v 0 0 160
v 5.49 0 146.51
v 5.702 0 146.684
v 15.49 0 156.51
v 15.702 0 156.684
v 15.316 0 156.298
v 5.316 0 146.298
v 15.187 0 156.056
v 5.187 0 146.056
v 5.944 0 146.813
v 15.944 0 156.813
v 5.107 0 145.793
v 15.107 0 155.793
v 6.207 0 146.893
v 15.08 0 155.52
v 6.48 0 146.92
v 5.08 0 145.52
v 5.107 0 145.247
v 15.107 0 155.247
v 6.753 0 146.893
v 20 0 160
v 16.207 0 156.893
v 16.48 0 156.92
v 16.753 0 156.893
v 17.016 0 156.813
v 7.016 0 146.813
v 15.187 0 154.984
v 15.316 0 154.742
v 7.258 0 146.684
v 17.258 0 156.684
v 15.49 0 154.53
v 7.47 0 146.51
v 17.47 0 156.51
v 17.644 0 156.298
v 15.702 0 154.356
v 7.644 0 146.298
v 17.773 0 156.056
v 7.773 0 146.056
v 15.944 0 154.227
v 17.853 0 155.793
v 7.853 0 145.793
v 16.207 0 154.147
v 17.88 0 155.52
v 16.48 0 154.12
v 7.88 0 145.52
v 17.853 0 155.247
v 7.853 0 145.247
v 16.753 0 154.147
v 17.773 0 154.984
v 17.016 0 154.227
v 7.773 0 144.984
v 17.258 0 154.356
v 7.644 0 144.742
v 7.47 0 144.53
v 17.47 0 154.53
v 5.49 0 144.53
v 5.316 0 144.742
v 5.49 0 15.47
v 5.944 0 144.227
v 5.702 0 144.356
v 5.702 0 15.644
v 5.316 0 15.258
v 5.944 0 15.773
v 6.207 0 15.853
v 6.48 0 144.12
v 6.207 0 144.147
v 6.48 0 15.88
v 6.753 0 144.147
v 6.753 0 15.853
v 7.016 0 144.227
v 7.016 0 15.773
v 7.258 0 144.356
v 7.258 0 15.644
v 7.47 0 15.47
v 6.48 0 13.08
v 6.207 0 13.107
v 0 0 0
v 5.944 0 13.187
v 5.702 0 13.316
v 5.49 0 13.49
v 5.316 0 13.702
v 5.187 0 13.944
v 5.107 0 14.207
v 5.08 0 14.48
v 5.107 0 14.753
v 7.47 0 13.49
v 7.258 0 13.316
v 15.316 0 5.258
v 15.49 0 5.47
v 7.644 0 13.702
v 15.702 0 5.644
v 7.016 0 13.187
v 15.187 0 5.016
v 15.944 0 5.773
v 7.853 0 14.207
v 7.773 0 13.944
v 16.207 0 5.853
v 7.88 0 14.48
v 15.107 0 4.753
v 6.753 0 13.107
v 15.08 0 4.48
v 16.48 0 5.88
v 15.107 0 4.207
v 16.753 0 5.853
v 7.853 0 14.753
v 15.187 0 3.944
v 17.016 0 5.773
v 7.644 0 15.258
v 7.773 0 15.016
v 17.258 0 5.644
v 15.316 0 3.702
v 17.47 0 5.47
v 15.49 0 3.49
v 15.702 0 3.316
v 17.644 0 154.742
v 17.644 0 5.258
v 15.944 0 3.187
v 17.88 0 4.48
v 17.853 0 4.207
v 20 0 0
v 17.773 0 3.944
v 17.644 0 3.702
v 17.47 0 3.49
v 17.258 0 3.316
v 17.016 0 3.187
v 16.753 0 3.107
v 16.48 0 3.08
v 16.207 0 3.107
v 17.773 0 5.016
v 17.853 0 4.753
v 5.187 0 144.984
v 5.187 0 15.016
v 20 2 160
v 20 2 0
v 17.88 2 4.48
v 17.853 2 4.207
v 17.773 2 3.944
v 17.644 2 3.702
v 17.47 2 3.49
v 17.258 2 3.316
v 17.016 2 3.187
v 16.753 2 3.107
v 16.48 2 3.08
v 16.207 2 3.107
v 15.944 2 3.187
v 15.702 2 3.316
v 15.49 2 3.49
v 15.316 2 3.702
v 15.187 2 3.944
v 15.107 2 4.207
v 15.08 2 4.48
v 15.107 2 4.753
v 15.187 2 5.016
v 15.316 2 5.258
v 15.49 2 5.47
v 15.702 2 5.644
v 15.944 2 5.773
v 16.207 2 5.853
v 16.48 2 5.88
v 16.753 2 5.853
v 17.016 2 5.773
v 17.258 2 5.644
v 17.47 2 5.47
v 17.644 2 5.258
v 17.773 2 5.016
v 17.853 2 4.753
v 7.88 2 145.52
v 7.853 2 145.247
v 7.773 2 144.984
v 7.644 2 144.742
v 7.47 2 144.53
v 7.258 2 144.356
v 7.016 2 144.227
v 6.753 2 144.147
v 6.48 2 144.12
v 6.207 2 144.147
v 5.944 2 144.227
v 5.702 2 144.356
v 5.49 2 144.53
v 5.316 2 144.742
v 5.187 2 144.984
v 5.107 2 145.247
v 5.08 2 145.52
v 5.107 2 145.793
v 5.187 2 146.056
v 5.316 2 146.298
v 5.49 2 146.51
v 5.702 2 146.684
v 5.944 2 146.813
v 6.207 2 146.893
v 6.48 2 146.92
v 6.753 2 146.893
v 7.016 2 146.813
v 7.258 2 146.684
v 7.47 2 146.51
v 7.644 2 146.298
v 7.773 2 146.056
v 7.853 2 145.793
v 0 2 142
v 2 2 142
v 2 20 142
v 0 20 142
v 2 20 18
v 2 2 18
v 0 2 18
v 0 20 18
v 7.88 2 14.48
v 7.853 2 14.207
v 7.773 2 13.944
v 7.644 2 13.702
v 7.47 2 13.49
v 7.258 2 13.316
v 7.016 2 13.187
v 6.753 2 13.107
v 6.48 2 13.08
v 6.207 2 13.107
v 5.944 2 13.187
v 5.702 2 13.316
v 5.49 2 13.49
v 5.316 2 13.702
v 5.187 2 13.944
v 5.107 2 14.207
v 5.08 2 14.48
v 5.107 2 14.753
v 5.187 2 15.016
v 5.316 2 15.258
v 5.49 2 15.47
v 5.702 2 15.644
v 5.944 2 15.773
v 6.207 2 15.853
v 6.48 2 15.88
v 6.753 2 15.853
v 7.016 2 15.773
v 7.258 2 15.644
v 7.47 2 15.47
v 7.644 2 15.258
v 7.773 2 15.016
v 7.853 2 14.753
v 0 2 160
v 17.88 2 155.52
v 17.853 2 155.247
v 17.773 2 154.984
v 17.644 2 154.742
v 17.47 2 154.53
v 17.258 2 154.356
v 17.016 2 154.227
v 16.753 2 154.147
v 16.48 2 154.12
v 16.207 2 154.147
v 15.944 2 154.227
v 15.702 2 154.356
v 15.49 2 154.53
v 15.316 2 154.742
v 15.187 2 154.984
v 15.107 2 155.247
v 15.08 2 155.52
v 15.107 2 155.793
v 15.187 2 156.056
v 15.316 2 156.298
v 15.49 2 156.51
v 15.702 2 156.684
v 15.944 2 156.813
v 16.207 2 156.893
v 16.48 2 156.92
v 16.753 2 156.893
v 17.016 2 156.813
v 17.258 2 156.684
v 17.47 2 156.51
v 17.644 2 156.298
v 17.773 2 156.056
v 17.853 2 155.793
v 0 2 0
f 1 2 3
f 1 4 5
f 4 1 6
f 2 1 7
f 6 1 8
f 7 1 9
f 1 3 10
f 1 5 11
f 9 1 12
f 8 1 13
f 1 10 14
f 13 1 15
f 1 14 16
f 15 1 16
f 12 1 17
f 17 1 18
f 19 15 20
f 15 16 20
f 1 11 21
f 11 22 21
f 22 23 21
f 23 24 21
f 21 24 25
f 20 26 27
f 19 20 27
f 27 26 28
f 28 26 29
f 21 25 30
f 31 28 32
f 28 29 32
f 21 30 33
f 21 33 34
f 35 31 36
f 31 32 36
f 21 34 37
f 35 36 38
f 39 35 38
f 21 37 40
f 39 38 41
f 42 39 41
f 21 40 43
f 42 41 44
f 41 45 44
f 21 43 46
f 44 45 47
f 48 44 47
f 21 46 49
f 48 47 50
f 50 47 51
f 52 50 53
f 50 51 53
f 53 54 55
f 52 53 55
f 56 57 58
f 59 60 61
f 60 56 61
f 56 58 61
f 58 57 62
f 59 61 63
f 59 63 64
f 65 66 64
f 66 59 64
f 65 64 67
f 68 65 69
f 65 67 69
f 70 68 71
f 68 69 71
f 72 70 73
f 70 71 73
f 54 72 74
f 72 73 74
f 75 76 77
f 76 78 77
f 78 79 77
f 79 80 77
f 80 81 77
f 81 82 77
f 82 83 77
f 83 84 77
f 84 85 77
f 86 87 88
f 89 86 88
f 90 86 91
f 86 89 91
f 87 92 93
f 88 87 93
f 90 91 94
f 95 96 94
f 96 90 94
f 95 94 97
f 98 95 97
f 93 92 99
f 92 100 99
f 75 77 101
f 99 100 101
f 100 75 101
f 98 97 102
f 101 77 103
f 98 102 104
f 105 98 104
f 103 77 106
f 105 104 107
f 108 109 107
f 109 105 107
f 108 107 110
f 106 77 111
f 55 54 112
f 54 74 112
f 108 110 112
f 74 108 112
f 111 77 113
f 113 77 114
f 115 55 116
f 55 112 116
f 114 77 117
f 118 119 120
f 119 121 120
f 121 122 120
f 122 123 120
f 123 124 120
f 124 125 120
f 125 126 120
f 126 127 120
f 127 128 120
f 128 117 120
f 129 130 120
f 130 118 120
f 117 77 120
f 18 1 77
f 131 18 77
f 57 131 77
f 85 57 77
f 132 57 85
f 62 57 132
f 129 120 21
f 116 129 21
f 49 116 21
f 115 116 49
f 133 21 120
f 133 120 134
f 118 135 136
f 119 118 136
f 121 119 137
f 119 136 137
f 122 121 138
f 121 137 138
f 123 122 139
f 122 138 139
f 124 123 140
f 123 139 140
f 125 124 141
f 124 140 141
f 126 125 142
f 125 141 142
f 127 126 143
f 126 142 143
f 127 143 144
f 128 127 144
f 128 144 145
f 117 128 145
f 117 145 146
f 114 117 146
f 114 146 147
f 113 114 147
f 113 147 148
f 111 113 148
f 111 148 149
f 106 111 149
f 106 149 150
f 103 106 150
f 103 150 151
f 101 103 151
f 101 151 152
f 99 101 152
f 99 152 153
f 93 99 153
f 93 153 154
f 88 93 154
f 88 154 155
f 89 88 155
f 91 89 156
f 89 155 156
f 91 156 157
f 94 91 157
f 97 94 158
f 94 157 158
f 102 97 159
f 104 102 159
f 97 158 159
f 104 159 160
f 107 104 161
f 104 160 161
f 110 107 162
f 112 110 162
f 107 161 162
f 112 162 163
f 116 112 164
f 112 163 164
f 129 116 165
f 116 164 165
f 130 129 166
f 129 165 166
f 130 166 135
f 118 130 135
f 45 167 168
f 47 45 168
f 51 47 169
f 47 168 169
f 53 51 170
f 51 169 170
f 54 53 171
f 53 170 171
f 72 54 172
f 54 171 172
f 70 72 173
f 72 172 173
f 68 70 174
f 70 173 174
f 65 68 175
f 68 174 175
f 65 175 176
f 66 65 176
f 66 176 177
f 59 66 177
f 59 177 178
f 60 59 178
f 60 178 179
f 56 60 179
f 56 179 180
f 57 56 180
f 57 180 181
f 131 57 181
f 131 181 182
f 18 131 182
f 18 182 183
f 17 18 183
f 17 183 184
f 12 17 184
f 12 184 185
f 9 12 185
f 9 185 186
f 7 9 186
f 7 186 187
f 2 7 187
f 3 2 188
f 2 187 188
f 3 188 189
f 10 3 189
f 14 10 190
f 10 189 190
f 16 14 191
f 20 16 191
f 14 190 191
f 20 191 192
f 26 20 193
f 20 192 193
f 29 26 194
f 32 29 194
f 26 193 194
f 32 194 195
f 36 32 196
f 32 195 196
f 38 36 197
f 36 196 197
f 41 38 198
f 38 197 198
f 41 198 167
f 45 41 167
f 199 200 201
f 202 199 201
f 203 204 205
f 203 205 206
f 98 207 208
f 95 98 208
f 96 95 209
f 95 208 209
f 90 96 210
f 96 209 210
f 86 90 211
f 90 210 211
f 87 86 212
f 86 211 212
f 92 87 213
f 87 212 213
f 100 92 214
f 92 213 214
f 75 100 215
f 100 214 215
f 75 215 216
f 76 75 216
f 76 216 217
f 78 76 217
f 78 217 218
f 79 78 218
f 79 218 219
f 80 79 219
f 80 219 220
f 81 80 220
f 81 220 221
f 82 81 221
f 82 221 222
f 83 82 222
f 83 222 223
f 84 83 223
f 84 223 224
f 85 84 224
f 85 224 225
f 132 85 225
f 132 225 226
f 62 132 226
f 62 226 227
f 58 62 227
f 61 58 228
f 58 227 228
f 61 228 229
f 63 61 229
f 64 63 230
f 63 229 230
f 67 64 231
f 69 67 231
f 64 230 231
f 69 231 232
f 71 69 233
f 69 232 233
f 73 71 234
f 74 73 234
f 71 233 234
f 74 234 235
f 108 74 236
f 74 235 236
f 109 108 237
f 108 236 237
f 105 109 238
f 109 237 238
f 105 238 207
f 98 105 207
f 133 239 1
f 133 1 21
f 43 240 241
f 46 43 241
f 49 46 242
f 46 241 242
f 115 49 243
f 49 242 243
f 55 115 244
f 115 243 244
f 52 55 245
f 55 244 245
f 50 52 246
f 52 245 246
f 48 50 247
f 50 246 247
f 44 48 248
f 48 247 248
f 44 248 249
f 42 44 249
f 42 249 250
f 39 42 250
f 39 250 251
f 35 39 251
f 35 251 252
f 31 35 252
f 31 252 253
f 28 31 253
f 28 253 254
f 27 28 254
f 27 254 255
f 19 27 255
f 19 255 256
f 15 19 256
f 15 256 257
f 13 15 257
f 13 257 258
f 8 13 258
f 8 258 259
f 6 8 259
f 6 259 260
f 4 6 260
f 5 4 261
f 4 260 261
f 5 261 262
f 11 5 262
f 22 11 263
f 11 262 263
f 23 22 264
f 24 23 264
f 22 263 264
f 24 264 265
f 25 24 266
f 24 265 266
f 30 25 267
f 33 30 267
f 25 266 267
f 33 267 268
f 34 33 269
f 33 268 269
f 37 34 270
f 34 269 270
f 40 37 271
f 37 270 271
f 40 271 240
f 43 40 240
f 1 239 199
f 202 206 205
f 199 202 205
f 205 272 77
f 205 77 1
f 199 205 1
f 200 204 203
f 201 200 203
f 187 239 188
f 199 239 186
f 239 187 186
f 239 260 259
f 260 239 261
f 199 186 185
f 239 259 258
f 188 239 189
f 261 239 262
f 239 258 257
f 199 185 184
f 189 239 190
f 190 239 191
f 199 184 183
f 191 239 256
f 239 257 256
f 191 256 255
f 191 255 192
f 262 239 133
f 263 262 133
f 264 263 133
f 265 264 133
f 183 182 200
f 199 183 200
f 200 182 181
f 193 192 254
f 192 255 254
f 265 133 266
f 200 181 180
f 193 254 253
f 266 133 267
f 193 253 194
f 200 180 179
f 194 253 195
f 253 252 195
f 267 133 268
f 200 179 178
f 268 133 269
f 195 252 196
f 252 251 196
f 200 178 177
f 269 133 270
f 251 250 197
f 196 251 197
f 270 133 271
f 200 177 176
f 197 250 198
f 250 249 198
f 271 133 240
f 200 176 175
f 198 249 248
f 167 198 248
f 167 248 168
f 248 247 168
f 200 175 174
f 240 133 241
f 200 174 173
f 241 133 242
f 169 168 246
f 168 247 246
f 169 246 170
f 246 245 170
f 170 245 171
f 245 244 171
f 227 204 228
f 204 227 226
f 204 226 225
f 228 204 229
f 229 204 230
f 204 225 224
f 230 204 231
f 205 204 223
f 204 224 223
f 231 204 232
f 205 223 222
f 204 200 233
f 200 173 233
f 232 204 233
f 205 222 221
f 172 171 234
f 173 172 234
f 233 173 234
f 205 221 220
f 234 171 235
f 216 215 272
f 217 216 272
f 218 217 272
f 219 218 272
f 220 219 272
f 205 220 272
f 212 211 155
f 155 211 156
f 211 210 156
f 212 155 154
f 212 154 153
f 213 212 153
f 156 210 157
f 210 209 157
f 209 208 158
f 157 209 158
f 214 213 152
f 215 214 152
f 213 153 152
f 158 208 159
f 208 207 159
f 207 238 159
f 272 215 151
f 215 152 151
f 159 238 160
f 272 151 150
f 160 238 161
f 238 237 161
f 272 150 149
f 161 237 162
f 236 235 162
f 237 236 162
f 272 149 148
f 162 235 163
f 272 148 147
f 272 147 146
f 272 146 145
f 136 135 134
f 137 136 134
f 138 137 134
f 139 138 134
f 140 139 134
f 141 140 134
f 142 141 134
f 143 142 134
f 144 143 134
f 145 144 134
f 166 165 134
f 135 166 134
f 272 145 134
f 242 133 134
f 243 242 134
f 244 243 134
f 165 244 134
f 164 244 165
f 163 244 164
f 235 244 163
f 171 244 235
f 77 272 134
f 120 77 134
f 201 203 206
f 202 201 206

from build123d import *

# Parameters (mm, degrees)
BOSS_EXTRU_1_DEPTH      = 160
ESQUISSE2_W             = 18
ESQUISSE2_H             = 18
ENL_V_MAT_EXTRU_1_DEPTH = 3
ESQUISSE6_R             = 1.4
ENL_V_MAT_EXTRU_5_DEPTH = 3


with BuildPart() as part:
    # Esquisse1 → Boss.-Extru.1 (new body)
    with BuildSketch(Plane.XY):
        Polygon((0, 0), (20, 0), (20, 2), (2, 2), (2, 20), (0, 20), align=None)
    extrude(amount=BOSS_EXTRU_1_DEPTH)

    # Esquisse2 → Enlèv. mat.-Extru.1 (cut, through all)
    with BuildSketch(Plane(origin=(2, 0, 0), x_dir=(0, 0, -1), z_dir=(1, 0, 0))):
        with Locations((-151, 11)):
            Rectangle(ESQUISSE2_W, ESQUISSE2_H)
        with Locations((-9, 11)):
            Rectangle(ESQUISSE2_W, ESQUISSE2_H)
    extrude(amount=-ENL_V_MAT_EXTRU_1_DEPTH, mode=Mode.SUBTRACT)

    # Esquisse6 → Enlèv. mat.-Extru.5 (cut, through all)
    with BuildSketch(Plane(origin=(0, 2, 0), x_dir=(1, 0, 0), z_dir=(0, 1, 0))):
        with Locations((6.48, -145.52)):
            Circle(ESQUISSE6_R)
        with Locations((6.48, -14.48)):
            Circle(ESQUISSE6_R)
        with Locations((16.48, -155.52)):
            Circle(ESQUISSE6_R)
        with Locations((16.48, -4.48)):
            Circle(ESQUISSE6_R)
    extrude(amount=-ENL_V_MAT_EXTRU_5_DEPTH, mode=Mode.SUBTRACT)


solid = part.part
